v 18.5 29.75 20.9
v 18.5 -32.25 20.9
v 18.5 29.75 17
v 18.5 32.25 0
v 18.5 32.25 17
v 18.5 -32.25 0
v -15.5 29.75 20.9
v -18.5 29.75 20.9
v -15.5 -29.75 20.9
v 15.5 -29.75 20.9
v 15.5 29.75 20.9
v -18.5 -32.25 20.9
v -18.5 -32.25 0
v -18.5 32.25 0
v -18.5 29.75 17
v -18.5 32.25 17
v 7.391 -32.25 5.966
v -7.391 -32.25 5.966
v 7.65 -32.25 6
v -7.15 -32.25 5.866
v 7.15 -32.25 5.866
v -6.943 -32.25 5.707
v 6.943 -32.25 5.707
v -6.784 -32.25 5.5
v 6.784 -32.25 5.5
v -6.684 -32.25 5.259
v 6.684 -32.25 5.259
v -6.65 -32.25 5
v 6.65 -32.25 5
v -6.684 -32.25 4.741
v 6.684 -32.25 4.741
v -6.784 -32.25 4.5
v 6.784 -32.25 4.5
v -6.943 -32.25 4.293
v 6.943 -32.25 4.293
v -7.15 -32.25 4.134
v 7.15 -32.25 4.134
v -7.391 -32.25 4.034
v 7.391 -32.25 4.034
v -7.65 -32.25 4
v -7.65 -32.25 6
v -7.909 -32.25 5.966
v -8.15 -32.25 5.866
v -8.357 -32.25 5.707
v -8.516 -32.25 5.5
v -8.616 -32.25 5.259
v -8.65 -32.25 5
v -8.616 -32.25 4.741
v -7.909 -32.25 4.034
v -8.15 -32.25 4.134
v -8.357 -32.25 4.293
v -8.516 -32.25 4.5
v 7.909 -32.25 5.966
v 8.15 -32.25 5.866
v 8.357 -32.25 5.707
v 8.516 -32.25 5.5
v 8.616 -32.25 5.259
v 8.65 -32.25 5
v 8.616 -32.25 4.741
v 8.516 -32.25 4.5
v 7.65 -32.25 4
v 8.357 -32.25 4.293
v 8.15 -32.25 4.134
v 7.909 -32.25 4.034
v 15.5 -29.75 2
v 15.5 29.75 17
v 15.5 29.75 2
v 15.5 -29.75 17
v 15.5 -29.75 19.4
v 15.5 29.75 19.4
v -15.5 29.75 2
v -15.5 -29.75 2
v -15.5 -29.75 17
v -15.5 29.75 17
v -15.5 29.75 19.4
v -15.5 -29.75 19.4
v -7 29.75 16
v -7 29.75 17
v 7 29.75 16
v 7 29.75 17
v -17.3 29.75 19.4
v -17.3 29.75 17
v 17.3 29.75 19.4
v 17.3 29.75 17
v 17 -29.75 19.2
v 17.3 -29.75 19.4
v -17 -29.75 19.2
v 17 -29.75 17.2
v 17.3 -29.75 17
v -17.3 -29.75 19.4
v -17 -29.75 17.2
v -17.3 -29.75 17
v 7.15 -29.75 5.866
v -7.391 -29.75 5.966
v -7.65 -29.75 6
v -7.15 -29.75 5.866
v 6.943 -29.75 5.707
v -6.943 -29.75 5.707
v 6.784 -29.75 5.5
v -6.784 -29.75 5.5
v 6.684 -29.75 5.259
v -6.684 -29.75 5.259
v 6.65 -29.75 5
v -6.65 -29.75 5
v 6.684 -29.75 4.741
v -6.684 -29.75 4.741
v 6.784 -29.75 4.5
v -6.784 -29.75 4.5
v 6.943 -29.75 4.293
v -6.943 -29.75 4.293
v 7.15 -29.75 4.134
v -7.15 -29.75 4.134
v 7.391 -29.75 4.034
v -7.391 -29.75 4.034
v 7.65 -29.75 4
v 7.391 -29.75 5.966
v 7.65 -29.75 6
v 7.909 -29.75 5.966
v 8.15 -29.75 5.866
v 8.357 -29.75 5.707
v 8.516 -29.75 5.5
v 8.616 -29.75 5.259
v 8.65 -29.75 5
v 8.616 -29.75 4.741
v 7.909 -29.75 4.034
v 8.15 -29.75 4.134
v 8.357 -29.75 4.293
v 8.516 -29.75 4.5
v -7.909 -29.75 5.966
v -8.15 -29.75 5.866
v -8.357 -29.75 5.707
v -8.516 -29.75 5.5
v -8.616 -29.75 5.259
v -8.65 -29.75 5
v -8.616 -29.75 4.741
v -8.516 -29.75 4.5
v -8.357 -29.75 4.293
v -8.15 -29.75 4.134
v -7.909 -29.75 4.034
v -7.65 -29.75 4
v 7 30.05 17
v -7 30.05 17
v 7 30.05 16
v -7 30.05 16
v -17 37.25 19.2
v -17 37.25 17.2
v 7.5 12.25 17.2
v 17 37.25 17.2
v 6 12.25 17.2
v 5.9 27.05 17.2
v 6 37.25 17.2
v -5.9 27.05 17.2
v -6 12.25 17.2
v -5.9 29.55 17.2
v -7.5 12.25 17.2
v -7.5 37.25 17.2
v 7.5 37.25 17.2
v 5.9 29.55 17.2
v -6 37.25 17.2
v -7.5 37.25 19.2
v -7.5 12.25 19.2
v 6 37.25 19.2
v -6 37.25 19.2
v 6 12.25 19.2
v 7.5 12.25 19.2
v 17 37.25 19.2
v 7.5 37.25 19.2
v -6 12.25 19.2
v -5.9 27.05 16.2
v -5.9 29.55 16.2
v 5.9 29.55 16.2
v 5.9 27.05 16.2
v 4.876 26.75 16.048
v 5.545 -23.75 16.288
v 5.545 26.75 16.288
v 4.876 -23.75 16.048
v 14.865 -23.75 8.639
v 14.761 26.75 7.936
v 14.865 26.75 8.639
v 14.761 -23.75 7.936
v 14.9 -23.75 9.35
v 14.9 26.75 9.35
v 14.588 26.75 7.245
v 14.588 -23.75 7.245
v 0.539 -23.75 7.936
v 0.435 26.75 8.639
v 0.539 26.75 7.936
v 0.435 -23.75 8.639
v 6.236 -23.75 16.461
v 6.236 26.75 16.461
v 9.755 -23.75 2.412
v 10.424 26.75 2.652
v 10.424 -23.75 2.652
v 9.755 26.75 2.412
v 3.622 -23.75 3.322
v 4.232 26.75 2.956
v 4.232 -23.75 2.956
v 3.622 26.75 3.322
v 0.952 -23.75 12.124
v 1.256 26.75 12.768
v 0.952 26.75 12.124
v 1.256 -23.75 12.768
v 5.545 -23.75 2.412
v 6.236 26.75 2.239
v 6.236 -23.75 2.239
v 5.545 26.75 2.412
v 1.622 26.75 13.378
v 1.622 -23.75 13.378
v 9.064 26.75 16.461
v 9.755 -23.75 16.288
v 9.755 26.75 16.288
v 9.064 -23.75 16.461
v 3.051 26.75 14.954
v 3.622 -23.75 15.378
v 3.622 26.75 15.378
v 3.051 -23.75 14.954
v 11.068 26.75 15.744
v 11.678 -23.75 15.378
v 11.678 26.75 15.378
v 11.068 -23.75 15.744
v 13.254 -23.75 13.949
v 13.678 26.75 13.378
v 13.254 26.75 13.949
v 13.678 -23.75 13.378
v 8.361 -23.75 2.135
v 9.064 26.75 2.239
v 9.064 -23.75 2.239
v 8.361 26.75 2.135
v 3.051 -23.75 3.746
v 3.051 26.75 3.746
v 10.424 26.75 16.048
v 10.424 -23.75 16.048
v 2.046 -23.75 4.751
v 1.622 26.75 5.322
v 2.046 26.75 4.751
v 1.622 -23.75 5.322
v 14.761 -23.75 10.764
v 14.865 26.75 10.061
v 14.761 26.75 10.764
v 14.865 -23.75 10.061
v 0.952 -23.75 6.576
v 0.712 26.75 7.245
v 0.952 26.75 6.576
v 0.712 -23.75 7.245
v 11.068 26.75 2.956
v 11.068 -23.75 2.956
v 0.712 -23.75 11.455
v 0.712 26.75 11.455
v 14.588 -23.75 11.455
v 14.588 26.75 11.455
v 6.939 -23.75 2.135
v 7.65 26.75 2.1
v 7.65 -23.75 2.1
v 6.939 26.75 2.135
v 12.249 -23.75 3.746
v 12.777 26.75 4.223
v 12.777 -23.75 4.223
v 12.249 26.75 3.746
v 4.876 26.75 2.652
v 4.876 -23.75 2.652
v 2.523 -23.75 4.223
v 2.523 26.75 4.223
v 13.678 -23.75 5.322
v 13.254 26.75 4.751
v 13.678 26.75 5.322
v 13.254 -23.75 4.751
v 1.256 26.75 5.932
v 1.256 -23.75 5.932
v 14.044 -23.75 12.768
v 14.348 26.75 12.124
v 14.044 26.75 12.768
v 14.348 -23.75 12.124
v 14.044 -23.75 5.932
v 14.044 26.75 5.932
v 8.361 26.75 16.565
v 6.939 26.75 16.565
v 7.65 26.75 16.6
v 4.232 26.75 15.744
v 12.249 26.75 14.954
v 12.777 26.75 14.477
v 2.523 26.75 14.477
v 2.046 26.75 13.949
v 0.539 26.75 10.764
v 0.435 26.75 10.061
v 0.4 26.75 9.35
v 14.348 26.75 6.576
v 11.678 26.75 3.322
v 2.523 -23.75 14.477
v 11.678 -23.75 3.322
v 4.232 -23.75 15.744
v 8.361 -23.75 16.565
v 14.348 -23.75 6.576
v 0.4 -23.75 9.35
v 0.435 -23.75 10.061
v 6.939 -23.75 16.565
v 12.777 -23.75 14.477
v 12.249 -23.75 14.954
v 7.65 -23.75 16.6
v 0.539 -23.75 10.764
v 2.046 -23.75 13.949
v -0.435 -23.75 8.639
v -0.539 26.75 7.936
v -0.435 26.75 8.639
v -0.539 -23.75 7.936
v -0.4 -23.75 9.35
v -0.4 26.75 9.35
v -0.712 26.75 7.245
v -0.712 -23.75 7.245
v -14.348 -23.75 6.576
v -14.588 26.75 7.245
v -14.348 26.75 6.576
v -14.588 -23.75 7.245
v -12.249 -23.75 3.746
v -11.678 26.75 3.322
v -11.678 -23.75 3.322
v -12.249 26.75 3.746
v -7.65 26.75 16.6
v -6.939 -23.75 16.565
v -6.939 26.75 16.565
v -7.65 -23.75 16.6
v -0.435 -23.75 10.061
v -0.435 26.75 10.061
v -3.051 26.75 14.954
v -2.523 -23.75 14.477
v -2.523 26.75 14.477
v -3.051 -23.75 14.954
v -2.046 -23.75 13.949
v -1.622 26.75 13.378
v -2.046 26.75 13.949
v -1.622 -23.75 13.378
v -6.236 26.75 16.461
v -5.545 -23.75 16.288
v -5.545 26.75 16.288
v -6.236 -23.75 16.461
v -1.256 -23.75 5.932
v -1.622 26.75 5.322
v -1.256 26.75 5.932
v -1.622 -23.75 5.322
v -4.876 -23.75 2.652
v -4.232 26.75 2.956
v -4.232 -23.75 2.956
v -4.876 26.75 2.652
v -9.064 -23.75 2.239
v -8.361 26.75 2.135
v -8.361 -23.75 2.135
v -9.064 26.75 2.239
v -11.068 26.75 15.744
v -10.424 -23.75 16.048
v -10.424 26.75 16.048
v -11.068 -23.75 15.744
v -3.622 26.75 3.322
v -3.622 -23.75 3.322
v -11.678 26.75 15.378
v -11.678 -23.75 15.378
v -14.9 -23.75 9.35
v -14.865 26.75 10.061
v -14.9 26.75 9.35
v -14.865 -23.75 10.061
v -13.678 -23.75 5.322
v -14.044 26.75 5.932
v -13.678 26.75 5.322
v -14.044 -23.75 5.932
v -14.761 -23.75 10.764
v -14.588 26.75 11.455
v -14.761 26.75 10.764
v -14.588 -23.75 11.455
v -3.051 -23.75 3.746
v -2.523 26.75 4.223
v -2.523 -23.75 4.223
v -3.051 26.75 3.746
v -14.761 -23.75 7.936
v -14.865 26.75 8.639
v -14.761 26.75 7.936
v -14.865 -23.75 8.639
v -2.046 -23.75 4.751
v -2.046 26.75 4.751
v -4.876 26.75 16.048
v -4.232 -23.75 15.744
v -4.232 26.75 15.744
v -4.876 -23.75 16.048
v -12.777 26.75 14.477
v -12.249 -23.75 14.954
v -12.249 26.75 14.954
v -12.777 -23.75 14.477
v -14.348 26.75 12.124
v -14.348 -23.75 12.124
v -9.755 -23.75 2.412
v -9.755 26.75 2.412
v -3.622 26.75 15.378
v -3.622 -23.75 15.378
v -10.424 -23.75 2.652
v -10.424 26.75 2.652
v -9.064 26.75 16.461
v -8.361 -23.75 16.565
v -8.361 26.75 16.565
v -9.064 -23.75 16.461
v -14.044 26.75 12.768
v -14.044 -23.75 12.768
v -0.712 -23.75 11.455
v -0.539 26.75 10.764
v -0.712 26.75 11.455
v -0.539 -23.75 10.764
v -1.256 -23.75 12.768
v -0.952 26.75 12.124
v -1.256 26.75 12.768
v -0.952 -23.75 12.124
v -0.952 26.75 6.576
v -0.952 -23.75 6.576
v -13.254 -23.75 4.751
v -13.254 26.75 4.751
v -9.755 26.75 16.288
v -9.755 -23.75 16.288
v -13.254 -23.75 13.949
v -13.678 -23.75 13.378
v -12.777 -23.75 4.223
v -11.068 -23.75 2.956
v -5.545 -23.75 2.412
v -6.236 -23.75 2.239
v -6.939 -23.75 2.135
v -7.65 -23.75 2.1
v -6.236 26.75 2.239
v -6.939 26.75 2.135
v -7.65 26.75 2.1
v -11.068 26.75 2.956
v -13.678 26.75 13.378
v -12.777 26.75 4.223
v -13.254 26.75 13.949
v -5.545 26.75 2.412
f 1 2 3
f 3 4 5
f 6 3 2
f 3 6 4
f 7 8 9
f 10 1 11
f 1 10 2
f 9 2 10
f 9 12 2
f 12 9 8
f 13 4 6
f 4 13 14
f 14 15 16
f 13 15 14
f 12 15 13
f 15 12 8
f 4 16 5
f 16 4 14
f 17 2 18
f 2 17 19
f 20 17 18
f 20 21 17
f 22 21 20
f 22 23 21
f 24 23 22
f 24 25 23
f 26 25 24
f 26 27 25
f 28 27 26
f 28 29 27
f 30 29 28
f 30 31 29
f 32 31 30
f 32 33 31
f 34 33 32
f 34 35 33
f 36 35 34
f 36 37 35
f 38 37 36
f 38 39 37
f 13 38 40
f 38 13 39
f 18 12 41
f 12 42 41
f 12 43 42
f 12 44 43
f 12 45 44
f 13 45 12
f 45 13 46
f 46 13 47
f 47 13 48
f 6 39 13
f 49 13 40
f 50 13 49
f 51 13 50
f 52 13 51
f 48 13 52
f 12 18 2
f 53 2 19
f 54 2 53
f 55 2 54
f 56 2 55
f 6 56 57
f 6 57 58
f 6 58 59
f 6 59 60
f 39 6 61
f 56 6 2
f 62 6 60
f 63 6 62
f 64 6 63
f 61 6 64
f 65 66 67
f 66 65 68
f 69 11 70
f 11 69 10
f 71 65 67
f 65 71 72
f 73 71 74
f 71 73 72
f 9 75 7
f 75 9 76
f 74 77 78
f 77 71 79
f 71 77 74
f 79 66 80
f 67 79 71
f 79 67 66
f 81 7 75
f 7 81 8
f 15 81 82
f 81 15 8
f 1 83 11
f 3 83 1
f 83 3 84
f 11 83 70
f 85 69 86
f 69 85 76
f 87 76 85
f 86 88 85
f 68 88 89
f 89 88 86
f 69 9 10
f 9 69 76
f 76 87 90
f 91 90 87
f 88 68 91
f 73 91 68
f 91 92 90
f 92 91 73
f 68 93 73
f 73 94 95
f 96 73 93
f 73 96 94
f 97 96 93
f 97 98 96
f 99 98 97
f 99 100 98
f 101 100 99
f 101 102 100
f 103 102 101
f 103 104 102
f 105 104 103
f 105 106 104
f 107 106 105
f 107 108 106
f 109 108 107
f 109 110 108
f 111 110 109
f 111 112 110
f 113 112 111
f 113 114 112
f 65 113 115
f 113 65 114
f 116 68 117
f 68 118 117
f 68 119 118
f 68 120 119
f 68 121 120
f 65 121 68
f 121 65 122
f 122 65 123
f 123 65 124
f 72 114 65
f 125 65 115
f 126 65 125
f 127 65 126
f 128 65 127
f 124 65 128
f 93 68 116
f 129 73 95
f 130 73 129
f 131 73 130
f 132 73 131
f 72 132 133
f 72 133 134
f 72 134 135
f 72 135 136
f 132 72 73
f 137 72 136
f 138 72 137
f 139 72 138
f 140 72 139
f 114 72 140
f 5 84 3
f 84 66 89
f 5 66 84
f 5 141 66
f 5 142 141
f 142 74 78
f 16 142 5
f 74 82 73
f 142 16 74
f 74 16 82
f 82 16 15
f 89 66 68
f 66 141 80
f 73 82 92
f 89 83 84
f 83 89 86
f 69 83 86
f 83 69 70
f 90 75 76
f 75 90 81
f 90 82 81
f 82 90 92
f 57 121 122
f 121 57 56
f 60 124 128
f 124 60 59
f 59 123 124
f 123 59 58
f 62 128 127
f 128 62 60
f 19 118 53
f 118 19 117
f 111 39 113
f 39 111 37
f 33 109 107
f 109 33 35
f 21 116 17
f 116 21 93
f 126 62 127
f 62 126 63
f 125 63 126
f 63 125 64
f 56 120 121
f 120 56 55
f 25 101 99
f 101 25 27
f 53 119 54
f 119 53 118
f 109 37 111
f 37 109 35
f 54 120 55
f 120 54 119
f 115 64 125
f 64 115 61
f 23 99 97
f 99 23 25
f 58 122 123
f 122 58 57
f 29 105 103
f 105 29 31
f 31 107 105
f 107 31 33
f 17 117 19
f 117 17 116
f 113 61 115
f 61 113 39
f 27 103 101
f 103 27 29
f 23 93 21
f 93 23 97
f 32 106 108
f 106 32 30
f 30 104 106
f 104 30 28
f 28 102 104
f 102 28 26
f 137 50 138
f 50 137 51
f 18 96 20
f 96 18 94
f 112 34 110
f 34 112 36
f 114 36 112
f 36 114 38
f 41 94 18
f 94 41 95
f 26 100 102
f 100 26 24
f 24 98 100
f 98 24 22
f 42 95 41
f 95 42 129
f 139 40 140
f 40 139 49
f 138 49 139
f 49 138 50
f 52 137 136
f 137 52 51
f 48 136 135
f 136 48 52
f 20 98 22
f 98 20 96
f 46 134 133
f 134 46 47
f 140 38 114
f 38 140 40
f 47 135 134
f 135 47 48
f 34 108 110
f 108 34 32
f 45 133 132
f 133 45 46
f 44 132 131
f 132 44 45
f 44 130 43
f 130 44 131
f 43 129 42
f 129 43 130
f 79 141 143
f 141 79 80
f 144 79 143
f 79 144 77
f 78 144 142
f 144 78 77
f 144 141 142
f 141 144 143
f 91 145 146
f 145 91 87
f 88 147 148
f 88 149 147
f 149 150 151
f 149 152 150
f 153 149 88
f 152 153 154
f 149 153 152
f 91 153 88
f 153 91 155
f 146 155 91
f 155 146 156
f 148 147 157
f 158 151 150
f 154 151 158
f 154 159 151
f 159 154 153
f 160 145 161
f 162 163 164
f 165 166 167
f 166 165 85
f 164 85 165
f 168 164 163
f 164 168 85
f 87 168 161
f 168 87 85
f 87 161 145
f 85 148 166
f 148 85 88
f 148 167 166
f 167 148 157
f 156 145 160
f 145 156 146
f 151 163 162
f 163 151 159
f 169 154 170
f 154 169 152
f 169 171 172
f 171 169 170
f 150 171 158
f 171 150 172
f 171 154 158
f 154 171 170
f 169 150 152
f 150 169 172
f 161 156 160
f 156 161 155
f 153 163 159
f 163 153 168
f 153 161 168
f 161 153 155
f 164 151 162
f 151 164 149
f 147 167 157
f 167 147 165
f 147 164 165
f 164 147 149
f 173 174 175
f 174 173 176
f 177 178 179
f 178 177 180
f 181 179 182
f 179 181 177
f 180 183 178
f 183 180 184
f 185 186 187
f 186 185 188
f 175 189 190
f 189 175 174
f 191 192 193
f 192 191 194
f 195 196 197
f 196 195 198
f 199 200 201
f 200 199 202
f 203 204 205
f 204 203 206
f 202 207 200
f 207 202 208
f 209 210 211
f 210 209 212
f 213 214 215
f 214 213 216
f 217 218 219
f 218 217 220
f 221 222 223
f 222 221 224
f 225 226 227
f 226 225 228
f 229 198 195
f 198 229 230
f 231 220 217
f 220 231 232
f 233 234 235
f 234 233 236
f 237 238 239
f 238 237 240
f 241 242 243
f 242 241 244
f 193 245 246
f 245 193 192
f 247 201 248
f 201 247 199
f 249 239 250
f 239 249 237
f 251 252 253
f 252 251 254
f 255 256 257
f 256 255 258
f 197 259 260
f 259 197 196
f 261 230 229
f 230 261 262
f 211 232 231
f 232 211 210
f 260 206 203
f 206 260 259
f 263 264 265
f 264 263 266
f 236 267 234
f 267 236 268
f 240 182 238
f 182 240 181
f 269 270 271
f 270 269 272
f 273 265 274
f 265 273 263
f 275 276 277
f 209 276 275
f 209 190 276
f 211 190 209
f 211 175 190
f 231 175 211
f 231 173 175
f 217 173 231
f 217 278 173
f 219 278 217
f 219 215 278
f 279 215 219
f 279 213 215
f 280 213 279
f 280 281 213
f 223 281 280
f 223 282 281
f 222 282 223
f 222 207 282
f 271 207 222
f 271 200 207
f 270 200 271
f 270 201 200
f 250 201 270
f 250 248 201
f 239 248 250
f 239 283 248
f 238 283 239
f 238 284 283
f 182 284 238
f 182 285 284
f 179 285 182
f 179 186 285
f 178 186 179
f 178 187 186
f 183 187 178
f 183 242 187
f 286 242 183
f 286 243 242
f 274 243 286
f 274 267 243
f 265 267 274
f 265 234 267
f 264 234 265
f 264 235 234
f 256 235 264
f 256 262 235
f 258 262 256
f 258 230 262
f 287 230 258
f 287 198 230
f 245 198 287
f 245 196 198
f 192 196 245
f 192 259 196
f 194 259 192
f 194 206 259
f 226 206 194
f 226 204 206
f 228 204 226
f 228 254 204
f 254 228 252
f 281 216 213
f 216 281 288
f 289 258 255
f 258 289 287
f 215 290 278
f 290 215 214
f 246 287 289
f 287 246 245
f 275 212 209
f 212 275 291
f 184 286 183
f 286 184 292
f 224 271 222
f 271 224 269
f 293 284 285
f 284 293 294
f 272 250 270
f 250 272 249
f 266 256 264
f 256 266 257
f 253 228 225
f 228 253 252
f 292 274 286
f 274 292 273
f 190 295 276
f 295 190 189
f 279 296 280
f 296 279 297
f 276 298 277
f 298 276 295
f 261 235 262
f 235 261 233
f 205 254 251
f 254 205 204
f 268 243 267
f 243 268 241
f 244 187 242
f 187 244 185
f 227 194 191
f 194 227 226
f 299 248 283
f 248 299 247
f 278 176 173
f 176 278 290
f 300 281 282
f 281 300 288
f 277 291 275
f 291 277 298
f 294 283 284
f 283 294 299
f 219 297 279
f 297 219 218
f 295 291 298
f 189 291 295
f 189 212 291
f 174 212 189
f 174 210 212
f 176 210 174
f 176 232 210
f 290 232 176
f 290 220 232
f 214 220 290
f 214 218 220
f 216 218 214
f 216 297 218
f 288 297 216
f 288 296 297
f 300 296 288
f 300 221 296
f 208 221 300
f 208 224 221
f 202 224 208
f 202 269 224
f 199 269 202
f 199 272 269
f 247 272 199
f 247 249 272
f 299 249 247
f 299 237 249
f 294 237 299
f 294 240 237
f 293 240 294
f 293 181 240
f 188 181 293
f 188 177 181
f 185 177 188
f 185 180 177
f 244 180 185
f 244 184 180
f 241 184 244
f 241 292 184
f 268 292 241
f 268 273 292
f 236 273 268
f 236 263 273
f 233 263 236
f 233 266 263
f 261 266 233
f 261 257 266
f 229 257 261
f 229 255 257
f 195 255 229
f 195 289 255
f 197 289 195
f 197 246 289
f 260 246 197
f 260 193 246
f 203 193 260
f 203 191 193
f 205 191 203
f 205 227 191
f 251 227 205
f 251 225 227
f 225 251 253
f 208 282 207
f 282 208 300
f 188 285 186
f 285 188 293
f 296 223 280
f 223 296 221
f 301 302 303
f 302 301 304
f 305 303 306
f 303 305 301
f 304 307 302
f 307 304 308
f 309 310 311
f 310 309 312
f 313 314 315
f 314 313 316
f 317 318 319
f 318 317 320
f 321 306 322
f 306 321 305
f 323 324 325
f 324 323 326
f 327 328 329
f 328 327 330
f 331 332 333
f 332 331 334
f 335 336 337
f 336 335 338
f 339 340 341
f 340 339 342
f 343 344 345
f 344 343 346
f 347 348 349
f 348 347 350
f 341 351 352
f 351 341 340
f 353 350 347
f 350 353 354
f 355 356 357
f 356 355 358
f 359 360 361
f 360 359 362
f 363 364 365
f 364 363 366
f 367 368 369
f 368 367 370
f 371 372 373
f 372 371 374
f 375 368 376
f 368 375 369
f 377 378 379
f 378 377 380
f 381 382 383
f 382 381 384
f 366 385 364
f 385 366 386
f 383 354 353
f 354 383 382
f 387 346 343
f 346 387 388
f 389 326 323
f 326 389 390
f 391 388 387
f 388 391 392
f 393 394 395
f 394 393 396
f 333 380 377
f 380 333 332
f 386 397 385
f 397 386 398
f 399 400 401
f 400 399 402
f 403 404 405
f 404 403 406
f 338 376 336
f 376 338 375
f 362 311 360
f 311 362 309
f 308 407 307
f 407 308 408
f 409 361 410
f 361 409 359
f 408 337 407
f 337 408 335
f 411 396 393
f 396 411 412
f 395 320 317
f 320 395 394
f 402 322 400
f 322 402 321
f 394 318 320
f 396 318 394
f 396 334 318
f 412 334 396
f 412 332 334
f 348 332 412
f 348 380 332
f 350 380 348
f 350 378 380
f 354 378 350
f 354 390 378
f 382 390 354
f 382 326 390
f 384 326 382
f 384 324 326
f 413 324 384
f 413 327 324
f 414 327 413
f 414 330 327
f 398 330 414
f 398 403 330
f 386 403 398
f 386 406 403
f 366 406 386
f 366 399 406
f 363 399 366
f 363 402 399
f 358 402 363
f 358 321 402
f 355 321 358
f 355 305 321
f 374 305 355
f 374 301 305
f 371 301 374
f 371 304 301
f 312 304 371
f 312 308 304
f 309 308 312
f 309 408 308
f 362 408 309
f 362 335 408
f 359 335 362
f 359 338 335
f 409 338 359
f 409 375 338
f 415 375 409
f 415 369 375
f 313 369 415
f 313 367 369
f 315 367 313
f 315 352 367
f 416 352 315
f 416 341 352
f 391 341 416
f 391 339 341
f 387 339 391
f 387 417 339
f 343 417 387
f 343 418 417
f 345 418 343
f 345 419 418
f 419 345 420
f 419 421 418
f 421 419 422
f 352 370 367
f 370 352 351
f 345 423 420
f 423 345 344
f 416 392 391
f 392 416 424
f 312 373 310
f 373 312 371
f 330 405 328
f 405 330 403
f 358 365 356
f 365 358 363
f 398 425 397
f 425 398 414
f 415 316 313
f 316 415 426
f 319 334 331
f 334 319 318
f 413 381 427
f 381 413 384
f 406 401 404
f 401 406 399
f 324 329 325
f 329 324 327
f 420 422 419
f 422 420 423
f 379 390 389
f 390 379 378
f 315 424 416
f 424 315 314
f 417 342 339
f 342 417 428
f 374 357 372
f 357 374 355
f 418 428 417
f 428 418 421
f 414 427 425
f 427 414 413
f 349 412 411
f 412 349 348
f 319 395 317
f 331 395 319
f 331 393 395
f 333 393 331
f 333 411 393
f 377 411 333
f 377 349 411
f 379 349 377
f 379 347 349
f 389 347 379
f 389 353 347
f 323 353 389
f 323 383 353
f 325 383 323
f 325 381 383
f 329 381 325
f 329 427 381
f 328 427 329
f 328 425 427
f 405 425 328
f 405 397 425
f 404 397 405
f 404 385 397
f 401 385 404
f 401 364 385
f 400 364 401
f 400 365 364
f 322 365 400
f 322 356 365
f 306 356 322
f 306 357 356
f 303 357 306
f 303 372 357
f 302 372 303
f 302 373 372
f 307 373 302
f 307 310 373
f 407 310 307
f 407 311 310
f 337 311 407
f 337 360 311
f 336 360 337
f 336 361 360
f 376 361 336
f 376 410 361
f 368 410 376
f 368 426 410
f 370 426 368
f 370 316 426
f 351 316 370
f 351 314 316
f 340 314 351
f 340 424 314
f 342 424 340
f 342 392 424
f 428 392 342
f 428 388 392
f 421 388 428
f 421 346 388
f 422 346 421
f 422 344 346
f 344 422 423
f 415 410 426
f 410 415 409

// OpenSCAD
/* Holder for two AA batteries with sliding cover.
   PLA, 0.4mm nozzle, no supports. Units mm.
   Print orientation: +Z up, parts rest on min z.
*/

// ---------- parameters ----------
battery_d = 14.5;
battery_l = 50.5;
side_gap = 0.6;      // battery side to wall
mid_gap = 0.8;       // between batteries
Wi = 2*battery_d + mid_gap + 2*side_gap; // 31.0 interior width
Li = battery_l + 3 + 6;                  // 59.5 interior length
floor_t = 2.0;
side_t = 3.0;
end_t = 2.5;
Wext = Wi + 2*side_t;   // 37
Lext = Li + 2*end_t;    // 64.5
wall_top = 20.9;
low_top = 17.0;
groove_bottom = 17.0;
groove_h = 2.4;
groove_top = groove_bottom + groove_h; // 19.4
groove_depth = 1.8;
engage = 1.5;
Wc = Wi + 2*engage;     // 34 cover width
Lc0 = Lext/2 + Li/2;      // 62 main length (leading edge butts on spring wall)
lip_len = 5.0;
Lc = Lc0 + lip_len;     // 67 total cover length
y0b = -Lext/2;          // -32.25 base min y
y1b = Lext/2;           // 32.25 base max y
y0c = -Li/2;            // -29.75 cover min y (stops at spring wall inner face)
y1c = Lext/2 + lip_len; // 37.25 cover max y
tc = 2.0;
finger_w = 12;
slot_w = 1.5;
finger_y0 = 12.25;
tooth_w = 11.8;
tooth_yl = 2.5;
tooth_y0 = 27.05;
tooth_y1 = tooth_y0 + tooth_yl; // 29.55: drops past low-wall inner face in closed pose
tooth_h = 1.0;
notch_hw = 7;
notch_y0 = 29.25;
notch_y1 = 30.05;
notch_bot = 16.0;
bx = battery_d/2 + mid_gap/2; // 7.65 battery center x
battery_y0 = -Li/2 + 6;       // -23.75 spring side
battery_y1 = battery_y0 + battery_l; // 26.75
battery_yc = (battery_y0 + battery_y1)/2; // 1.5
battery_zc = floor_t + battery_d/2 + 0.1; // 9.35 slight lift
wire_z = 5;
wire_r = 1.0;

part = "assembly"; // [base, cover, assembly]
cadverify_only = "";
module instance(name, part, unit = 1) {
    echo(cadverify_instance = [name, part, unit]);
    if (cadverify_only == "" || cadverify_only == name) children();
}

module battery() {
    rotate([-90,0,0])
        cylinder(d=battery_d, h=battery_l, center=true, $fn=64);
}

module base() {
    difference() {
        // outer solid
        translate([-Wext/2, y0b, 0])
            cube([Wext, Lext, wall_top]);
        // interior cavity open at top
        translate([-Wi/2, -Li/2, floor_t])
            cube([Wi, Li, wall_top - floor_t + 1]);
        // low end wall cut (+Y end)
        translate([-Wext/2, Li/2, low_top])
            cube([Wext, Lext/2 - Li/2 + 0.5, wall_top - low_top + 1]);
        // left groove
        translate([Wi/2, -Li/2, groove_bottom])
            cube([groove_depth, Li/2 + Lext/2 + 0.5, groove_h]);
        // right groove
        translate([-Wi/2 - groove_depth, -Li/2, groove_bottom])
            cube([groove_depth, Li/2 + Lext/2 + 0.5, groove_h]);
        // wire holes through spring (-Y) wall
        translate([bx, y0b - 1, wire_z])
            rotate([-90,0,0])
                cylinder(r=wire_r, h=end_t + 2, $fn=24);
        translate([-bx, y0b - 1, wire_z])
            rotate([-90,0,0])
                cylinder(r=wire_r, h=end_t + 2, $fn=24);
        // latch notch in low wall top
        translate([-notch_hw, notch_y0, notch_bot])
            cube([2*notch_hw, notch_y1 - notch_y0, low_top - notch_bot + 0.02]);
    }
}

module cover() {
    // print orientation: plate 0..tc, tooth on top tc..tc+tooth_h
    difference() {
        union() {
            translate([-Wc/2, y0c, 0])
                cube([Wc, Lc, tc]);
            // latch tooth on top (becomes bottom after flip)
            translate([-tooth_w/2, tooth_y0, tc])
                cube([tooth_w, tooth_yl, tooth_h]);
        }
        // finger slots, open at +Y lip end
        translate([finger_w/2, finger_y0, -0.5])
            cube([slot_w, y1c - finger_y0 + 0.5, tc + 1.5]);
        translate([-finger_w/2 - slot_w, finger_y0, -0.5])
            cube([slot_w, y1c - finger_y0 + 0.5, tc + 1.5]);
    }
}

module assembly() {
    instance("base", "base", 1) base();
    instance("battery_left", "external", 1)
        translate([bx, battery_yc, battery_zc]) battery();
    instance("battery_right", "external", 1)
        translate([-bx, battery_yc, battery_zc]) battery();
    // cover printed upside-down: rotate 180 about Y then lift
    instance("cover", "cover", 1)
        translate([0, 0, 19.2]) rotate([0,180,0]) cover();
}

// ---------- specs ----------
if (part == "base") {
    echo(cadverify_spec = [
        ["bounds", [[-Wext/2, y0b, 0], [Wext/2, y1b, wall_top]]],
        ["bodies", 1],
        ["through_holes", 2],
        ["support_faces", [["bottom", "-z", 2000]]],
        ["overhangs_allowed", [
            ["groove ceilings bridge 3.6mm", [[Wi/2 - 0.6, -Li/2 - 0.5, groove_bottom - 0.5], [Wi/2 + groove_depth + 0.5, y1b + 0.2, groove_top + 0.6]]],
            ["groove ceilings bridge 3.6mm", [[-Wi/2 - groove_depth - 0.5, -Li/2 - 0.5, groove_bottom - 0.5], [-Wi/2 + 0.6, y1b + 0.2, groove_top + 0.6]]],
            ["wire holes 2mm dia bridges", [[-10, y0b - 0.5, wire_z - 1.5], [10, -Li/2 + 0.5, wire_z + 1.5]]]
        ]],
        ["copies", 1],
        ["details", [
            ["cavity", "void", [[-Wi/2, -Li/2, floor_t], [Wi/2, Li/2, 17]], 0.9],
            ["spring_room", "void", [[-Wi/2, -Li/2, floor_t], [Wi/2, -Li/2 + 6, 16.6]], 0.9],
            ["pos_room", "void", [[-Wi/2, Li/2 - 3, floor_t], [Wi/2, Li/2, 16.6]], 0.9],
            ["groove_left", "void", [[Wi/2, -Li/2, groove_bottom], [Wi/2 + groove_depth, y1b, groove_top]], 0.85],
            ["groove_right", "void", [[-Wi/2 - groove_depth, -Li/2, groove_bottom], [-Wi/2, y1b, groove_top]], 0.85],
            ["notch", "void", [[-notch_hw, notch_y0, notch_bot], [notch_hw, notch_y1, low_top + 0.02]], 0.85],
            ["wire1", "hole", [bx, y0b - 1, wire_z], [0, 1, 0], [[0, 2], [2, 2]]],
            ["wire2", "hole", [-bx, y0b - 1, wire_z], [0, 1, 0], [[0, 2], [2, 2]]],
            ["floor", "thickness", [0, 0, -1], [0, 0, 1], 2.0],
            ["side_wall", "thickness", [Wext/2 + 1, 0, 18.2], [-1, 0, 0], 1.2],
            ["end_wall", "thickness", [0, y1b + 1, 10], [0, -1, 0], 2.5]
        ]]
    ]);
    base();
} else if (part == "cover") {
    echo(cadverify_spec = [
        ["bounds", [[-Wc/2, y0c, 0], [Wc/2, y1c, tc + tooth_h]]],
        ["bodies", 1],
        ["through_holes", 0],
        ["support_faces", [["bottom", "-z", 1500]]],
        ["overhangs_allowed", []],
        ["copies", 1],
        ["details", [
            ["plate", "thickness", [0, -10, -1], [0, 0, 1], 2.0],
            ["finger", "material", [[-finger_w/2, finger_y0, 0], [finger_w/2, y1c, tc]], 0.85],
            ["slot_left", "void", [[finger_w/2, finger_y0, -0.5], [finger_w/2 + slot_w, y1c + 0.01, tc + 0.5]], 0.85],
            ["slot_right", "void", [[-finger_w/2 - slot_w, finger_y0, -0.5], [-finger_w/2, y1c + 0.01, tc + 0.5]], 0.85],
            ["tooth", "material", [[-tooth_w/2, tooth_y0, tc], [tooth_w/2, tooth_y1, tc + tooth_h]], 0.85],
            ["lip", "material", [[-Wc/2, y1b, 0], [Wc/2, y1c, tc]], 0.9]
        ]]
    ]);
    cover();
} else if (part == "assembly") {
    echo(cadverify_spec = [
        ["bounds", [[-Wext/2, y0b, 0], [Wext/2, y1c, wall_top]]],
        ["support_faces", [["bottom", "-z", 2000]]],
        ["allowed_interferences", []],
        ["motions", [
            ["slide_cover", ["cover"], "slide", [0, 1, 0], [0, 60], ["flex", [["cover", "base", 1.0, "latch tooth rides over end wall"]]]]
        ]],
        ["assembly_order", [
            [["base"], [0, 0, 0]],
            [["battery_left"], [0, 0, -1]],
            [["battery_right"], [0, 0, -1]],
            [["cover"], [0, -1, 0]]
        ]]
    ]);
    assembly();
}
